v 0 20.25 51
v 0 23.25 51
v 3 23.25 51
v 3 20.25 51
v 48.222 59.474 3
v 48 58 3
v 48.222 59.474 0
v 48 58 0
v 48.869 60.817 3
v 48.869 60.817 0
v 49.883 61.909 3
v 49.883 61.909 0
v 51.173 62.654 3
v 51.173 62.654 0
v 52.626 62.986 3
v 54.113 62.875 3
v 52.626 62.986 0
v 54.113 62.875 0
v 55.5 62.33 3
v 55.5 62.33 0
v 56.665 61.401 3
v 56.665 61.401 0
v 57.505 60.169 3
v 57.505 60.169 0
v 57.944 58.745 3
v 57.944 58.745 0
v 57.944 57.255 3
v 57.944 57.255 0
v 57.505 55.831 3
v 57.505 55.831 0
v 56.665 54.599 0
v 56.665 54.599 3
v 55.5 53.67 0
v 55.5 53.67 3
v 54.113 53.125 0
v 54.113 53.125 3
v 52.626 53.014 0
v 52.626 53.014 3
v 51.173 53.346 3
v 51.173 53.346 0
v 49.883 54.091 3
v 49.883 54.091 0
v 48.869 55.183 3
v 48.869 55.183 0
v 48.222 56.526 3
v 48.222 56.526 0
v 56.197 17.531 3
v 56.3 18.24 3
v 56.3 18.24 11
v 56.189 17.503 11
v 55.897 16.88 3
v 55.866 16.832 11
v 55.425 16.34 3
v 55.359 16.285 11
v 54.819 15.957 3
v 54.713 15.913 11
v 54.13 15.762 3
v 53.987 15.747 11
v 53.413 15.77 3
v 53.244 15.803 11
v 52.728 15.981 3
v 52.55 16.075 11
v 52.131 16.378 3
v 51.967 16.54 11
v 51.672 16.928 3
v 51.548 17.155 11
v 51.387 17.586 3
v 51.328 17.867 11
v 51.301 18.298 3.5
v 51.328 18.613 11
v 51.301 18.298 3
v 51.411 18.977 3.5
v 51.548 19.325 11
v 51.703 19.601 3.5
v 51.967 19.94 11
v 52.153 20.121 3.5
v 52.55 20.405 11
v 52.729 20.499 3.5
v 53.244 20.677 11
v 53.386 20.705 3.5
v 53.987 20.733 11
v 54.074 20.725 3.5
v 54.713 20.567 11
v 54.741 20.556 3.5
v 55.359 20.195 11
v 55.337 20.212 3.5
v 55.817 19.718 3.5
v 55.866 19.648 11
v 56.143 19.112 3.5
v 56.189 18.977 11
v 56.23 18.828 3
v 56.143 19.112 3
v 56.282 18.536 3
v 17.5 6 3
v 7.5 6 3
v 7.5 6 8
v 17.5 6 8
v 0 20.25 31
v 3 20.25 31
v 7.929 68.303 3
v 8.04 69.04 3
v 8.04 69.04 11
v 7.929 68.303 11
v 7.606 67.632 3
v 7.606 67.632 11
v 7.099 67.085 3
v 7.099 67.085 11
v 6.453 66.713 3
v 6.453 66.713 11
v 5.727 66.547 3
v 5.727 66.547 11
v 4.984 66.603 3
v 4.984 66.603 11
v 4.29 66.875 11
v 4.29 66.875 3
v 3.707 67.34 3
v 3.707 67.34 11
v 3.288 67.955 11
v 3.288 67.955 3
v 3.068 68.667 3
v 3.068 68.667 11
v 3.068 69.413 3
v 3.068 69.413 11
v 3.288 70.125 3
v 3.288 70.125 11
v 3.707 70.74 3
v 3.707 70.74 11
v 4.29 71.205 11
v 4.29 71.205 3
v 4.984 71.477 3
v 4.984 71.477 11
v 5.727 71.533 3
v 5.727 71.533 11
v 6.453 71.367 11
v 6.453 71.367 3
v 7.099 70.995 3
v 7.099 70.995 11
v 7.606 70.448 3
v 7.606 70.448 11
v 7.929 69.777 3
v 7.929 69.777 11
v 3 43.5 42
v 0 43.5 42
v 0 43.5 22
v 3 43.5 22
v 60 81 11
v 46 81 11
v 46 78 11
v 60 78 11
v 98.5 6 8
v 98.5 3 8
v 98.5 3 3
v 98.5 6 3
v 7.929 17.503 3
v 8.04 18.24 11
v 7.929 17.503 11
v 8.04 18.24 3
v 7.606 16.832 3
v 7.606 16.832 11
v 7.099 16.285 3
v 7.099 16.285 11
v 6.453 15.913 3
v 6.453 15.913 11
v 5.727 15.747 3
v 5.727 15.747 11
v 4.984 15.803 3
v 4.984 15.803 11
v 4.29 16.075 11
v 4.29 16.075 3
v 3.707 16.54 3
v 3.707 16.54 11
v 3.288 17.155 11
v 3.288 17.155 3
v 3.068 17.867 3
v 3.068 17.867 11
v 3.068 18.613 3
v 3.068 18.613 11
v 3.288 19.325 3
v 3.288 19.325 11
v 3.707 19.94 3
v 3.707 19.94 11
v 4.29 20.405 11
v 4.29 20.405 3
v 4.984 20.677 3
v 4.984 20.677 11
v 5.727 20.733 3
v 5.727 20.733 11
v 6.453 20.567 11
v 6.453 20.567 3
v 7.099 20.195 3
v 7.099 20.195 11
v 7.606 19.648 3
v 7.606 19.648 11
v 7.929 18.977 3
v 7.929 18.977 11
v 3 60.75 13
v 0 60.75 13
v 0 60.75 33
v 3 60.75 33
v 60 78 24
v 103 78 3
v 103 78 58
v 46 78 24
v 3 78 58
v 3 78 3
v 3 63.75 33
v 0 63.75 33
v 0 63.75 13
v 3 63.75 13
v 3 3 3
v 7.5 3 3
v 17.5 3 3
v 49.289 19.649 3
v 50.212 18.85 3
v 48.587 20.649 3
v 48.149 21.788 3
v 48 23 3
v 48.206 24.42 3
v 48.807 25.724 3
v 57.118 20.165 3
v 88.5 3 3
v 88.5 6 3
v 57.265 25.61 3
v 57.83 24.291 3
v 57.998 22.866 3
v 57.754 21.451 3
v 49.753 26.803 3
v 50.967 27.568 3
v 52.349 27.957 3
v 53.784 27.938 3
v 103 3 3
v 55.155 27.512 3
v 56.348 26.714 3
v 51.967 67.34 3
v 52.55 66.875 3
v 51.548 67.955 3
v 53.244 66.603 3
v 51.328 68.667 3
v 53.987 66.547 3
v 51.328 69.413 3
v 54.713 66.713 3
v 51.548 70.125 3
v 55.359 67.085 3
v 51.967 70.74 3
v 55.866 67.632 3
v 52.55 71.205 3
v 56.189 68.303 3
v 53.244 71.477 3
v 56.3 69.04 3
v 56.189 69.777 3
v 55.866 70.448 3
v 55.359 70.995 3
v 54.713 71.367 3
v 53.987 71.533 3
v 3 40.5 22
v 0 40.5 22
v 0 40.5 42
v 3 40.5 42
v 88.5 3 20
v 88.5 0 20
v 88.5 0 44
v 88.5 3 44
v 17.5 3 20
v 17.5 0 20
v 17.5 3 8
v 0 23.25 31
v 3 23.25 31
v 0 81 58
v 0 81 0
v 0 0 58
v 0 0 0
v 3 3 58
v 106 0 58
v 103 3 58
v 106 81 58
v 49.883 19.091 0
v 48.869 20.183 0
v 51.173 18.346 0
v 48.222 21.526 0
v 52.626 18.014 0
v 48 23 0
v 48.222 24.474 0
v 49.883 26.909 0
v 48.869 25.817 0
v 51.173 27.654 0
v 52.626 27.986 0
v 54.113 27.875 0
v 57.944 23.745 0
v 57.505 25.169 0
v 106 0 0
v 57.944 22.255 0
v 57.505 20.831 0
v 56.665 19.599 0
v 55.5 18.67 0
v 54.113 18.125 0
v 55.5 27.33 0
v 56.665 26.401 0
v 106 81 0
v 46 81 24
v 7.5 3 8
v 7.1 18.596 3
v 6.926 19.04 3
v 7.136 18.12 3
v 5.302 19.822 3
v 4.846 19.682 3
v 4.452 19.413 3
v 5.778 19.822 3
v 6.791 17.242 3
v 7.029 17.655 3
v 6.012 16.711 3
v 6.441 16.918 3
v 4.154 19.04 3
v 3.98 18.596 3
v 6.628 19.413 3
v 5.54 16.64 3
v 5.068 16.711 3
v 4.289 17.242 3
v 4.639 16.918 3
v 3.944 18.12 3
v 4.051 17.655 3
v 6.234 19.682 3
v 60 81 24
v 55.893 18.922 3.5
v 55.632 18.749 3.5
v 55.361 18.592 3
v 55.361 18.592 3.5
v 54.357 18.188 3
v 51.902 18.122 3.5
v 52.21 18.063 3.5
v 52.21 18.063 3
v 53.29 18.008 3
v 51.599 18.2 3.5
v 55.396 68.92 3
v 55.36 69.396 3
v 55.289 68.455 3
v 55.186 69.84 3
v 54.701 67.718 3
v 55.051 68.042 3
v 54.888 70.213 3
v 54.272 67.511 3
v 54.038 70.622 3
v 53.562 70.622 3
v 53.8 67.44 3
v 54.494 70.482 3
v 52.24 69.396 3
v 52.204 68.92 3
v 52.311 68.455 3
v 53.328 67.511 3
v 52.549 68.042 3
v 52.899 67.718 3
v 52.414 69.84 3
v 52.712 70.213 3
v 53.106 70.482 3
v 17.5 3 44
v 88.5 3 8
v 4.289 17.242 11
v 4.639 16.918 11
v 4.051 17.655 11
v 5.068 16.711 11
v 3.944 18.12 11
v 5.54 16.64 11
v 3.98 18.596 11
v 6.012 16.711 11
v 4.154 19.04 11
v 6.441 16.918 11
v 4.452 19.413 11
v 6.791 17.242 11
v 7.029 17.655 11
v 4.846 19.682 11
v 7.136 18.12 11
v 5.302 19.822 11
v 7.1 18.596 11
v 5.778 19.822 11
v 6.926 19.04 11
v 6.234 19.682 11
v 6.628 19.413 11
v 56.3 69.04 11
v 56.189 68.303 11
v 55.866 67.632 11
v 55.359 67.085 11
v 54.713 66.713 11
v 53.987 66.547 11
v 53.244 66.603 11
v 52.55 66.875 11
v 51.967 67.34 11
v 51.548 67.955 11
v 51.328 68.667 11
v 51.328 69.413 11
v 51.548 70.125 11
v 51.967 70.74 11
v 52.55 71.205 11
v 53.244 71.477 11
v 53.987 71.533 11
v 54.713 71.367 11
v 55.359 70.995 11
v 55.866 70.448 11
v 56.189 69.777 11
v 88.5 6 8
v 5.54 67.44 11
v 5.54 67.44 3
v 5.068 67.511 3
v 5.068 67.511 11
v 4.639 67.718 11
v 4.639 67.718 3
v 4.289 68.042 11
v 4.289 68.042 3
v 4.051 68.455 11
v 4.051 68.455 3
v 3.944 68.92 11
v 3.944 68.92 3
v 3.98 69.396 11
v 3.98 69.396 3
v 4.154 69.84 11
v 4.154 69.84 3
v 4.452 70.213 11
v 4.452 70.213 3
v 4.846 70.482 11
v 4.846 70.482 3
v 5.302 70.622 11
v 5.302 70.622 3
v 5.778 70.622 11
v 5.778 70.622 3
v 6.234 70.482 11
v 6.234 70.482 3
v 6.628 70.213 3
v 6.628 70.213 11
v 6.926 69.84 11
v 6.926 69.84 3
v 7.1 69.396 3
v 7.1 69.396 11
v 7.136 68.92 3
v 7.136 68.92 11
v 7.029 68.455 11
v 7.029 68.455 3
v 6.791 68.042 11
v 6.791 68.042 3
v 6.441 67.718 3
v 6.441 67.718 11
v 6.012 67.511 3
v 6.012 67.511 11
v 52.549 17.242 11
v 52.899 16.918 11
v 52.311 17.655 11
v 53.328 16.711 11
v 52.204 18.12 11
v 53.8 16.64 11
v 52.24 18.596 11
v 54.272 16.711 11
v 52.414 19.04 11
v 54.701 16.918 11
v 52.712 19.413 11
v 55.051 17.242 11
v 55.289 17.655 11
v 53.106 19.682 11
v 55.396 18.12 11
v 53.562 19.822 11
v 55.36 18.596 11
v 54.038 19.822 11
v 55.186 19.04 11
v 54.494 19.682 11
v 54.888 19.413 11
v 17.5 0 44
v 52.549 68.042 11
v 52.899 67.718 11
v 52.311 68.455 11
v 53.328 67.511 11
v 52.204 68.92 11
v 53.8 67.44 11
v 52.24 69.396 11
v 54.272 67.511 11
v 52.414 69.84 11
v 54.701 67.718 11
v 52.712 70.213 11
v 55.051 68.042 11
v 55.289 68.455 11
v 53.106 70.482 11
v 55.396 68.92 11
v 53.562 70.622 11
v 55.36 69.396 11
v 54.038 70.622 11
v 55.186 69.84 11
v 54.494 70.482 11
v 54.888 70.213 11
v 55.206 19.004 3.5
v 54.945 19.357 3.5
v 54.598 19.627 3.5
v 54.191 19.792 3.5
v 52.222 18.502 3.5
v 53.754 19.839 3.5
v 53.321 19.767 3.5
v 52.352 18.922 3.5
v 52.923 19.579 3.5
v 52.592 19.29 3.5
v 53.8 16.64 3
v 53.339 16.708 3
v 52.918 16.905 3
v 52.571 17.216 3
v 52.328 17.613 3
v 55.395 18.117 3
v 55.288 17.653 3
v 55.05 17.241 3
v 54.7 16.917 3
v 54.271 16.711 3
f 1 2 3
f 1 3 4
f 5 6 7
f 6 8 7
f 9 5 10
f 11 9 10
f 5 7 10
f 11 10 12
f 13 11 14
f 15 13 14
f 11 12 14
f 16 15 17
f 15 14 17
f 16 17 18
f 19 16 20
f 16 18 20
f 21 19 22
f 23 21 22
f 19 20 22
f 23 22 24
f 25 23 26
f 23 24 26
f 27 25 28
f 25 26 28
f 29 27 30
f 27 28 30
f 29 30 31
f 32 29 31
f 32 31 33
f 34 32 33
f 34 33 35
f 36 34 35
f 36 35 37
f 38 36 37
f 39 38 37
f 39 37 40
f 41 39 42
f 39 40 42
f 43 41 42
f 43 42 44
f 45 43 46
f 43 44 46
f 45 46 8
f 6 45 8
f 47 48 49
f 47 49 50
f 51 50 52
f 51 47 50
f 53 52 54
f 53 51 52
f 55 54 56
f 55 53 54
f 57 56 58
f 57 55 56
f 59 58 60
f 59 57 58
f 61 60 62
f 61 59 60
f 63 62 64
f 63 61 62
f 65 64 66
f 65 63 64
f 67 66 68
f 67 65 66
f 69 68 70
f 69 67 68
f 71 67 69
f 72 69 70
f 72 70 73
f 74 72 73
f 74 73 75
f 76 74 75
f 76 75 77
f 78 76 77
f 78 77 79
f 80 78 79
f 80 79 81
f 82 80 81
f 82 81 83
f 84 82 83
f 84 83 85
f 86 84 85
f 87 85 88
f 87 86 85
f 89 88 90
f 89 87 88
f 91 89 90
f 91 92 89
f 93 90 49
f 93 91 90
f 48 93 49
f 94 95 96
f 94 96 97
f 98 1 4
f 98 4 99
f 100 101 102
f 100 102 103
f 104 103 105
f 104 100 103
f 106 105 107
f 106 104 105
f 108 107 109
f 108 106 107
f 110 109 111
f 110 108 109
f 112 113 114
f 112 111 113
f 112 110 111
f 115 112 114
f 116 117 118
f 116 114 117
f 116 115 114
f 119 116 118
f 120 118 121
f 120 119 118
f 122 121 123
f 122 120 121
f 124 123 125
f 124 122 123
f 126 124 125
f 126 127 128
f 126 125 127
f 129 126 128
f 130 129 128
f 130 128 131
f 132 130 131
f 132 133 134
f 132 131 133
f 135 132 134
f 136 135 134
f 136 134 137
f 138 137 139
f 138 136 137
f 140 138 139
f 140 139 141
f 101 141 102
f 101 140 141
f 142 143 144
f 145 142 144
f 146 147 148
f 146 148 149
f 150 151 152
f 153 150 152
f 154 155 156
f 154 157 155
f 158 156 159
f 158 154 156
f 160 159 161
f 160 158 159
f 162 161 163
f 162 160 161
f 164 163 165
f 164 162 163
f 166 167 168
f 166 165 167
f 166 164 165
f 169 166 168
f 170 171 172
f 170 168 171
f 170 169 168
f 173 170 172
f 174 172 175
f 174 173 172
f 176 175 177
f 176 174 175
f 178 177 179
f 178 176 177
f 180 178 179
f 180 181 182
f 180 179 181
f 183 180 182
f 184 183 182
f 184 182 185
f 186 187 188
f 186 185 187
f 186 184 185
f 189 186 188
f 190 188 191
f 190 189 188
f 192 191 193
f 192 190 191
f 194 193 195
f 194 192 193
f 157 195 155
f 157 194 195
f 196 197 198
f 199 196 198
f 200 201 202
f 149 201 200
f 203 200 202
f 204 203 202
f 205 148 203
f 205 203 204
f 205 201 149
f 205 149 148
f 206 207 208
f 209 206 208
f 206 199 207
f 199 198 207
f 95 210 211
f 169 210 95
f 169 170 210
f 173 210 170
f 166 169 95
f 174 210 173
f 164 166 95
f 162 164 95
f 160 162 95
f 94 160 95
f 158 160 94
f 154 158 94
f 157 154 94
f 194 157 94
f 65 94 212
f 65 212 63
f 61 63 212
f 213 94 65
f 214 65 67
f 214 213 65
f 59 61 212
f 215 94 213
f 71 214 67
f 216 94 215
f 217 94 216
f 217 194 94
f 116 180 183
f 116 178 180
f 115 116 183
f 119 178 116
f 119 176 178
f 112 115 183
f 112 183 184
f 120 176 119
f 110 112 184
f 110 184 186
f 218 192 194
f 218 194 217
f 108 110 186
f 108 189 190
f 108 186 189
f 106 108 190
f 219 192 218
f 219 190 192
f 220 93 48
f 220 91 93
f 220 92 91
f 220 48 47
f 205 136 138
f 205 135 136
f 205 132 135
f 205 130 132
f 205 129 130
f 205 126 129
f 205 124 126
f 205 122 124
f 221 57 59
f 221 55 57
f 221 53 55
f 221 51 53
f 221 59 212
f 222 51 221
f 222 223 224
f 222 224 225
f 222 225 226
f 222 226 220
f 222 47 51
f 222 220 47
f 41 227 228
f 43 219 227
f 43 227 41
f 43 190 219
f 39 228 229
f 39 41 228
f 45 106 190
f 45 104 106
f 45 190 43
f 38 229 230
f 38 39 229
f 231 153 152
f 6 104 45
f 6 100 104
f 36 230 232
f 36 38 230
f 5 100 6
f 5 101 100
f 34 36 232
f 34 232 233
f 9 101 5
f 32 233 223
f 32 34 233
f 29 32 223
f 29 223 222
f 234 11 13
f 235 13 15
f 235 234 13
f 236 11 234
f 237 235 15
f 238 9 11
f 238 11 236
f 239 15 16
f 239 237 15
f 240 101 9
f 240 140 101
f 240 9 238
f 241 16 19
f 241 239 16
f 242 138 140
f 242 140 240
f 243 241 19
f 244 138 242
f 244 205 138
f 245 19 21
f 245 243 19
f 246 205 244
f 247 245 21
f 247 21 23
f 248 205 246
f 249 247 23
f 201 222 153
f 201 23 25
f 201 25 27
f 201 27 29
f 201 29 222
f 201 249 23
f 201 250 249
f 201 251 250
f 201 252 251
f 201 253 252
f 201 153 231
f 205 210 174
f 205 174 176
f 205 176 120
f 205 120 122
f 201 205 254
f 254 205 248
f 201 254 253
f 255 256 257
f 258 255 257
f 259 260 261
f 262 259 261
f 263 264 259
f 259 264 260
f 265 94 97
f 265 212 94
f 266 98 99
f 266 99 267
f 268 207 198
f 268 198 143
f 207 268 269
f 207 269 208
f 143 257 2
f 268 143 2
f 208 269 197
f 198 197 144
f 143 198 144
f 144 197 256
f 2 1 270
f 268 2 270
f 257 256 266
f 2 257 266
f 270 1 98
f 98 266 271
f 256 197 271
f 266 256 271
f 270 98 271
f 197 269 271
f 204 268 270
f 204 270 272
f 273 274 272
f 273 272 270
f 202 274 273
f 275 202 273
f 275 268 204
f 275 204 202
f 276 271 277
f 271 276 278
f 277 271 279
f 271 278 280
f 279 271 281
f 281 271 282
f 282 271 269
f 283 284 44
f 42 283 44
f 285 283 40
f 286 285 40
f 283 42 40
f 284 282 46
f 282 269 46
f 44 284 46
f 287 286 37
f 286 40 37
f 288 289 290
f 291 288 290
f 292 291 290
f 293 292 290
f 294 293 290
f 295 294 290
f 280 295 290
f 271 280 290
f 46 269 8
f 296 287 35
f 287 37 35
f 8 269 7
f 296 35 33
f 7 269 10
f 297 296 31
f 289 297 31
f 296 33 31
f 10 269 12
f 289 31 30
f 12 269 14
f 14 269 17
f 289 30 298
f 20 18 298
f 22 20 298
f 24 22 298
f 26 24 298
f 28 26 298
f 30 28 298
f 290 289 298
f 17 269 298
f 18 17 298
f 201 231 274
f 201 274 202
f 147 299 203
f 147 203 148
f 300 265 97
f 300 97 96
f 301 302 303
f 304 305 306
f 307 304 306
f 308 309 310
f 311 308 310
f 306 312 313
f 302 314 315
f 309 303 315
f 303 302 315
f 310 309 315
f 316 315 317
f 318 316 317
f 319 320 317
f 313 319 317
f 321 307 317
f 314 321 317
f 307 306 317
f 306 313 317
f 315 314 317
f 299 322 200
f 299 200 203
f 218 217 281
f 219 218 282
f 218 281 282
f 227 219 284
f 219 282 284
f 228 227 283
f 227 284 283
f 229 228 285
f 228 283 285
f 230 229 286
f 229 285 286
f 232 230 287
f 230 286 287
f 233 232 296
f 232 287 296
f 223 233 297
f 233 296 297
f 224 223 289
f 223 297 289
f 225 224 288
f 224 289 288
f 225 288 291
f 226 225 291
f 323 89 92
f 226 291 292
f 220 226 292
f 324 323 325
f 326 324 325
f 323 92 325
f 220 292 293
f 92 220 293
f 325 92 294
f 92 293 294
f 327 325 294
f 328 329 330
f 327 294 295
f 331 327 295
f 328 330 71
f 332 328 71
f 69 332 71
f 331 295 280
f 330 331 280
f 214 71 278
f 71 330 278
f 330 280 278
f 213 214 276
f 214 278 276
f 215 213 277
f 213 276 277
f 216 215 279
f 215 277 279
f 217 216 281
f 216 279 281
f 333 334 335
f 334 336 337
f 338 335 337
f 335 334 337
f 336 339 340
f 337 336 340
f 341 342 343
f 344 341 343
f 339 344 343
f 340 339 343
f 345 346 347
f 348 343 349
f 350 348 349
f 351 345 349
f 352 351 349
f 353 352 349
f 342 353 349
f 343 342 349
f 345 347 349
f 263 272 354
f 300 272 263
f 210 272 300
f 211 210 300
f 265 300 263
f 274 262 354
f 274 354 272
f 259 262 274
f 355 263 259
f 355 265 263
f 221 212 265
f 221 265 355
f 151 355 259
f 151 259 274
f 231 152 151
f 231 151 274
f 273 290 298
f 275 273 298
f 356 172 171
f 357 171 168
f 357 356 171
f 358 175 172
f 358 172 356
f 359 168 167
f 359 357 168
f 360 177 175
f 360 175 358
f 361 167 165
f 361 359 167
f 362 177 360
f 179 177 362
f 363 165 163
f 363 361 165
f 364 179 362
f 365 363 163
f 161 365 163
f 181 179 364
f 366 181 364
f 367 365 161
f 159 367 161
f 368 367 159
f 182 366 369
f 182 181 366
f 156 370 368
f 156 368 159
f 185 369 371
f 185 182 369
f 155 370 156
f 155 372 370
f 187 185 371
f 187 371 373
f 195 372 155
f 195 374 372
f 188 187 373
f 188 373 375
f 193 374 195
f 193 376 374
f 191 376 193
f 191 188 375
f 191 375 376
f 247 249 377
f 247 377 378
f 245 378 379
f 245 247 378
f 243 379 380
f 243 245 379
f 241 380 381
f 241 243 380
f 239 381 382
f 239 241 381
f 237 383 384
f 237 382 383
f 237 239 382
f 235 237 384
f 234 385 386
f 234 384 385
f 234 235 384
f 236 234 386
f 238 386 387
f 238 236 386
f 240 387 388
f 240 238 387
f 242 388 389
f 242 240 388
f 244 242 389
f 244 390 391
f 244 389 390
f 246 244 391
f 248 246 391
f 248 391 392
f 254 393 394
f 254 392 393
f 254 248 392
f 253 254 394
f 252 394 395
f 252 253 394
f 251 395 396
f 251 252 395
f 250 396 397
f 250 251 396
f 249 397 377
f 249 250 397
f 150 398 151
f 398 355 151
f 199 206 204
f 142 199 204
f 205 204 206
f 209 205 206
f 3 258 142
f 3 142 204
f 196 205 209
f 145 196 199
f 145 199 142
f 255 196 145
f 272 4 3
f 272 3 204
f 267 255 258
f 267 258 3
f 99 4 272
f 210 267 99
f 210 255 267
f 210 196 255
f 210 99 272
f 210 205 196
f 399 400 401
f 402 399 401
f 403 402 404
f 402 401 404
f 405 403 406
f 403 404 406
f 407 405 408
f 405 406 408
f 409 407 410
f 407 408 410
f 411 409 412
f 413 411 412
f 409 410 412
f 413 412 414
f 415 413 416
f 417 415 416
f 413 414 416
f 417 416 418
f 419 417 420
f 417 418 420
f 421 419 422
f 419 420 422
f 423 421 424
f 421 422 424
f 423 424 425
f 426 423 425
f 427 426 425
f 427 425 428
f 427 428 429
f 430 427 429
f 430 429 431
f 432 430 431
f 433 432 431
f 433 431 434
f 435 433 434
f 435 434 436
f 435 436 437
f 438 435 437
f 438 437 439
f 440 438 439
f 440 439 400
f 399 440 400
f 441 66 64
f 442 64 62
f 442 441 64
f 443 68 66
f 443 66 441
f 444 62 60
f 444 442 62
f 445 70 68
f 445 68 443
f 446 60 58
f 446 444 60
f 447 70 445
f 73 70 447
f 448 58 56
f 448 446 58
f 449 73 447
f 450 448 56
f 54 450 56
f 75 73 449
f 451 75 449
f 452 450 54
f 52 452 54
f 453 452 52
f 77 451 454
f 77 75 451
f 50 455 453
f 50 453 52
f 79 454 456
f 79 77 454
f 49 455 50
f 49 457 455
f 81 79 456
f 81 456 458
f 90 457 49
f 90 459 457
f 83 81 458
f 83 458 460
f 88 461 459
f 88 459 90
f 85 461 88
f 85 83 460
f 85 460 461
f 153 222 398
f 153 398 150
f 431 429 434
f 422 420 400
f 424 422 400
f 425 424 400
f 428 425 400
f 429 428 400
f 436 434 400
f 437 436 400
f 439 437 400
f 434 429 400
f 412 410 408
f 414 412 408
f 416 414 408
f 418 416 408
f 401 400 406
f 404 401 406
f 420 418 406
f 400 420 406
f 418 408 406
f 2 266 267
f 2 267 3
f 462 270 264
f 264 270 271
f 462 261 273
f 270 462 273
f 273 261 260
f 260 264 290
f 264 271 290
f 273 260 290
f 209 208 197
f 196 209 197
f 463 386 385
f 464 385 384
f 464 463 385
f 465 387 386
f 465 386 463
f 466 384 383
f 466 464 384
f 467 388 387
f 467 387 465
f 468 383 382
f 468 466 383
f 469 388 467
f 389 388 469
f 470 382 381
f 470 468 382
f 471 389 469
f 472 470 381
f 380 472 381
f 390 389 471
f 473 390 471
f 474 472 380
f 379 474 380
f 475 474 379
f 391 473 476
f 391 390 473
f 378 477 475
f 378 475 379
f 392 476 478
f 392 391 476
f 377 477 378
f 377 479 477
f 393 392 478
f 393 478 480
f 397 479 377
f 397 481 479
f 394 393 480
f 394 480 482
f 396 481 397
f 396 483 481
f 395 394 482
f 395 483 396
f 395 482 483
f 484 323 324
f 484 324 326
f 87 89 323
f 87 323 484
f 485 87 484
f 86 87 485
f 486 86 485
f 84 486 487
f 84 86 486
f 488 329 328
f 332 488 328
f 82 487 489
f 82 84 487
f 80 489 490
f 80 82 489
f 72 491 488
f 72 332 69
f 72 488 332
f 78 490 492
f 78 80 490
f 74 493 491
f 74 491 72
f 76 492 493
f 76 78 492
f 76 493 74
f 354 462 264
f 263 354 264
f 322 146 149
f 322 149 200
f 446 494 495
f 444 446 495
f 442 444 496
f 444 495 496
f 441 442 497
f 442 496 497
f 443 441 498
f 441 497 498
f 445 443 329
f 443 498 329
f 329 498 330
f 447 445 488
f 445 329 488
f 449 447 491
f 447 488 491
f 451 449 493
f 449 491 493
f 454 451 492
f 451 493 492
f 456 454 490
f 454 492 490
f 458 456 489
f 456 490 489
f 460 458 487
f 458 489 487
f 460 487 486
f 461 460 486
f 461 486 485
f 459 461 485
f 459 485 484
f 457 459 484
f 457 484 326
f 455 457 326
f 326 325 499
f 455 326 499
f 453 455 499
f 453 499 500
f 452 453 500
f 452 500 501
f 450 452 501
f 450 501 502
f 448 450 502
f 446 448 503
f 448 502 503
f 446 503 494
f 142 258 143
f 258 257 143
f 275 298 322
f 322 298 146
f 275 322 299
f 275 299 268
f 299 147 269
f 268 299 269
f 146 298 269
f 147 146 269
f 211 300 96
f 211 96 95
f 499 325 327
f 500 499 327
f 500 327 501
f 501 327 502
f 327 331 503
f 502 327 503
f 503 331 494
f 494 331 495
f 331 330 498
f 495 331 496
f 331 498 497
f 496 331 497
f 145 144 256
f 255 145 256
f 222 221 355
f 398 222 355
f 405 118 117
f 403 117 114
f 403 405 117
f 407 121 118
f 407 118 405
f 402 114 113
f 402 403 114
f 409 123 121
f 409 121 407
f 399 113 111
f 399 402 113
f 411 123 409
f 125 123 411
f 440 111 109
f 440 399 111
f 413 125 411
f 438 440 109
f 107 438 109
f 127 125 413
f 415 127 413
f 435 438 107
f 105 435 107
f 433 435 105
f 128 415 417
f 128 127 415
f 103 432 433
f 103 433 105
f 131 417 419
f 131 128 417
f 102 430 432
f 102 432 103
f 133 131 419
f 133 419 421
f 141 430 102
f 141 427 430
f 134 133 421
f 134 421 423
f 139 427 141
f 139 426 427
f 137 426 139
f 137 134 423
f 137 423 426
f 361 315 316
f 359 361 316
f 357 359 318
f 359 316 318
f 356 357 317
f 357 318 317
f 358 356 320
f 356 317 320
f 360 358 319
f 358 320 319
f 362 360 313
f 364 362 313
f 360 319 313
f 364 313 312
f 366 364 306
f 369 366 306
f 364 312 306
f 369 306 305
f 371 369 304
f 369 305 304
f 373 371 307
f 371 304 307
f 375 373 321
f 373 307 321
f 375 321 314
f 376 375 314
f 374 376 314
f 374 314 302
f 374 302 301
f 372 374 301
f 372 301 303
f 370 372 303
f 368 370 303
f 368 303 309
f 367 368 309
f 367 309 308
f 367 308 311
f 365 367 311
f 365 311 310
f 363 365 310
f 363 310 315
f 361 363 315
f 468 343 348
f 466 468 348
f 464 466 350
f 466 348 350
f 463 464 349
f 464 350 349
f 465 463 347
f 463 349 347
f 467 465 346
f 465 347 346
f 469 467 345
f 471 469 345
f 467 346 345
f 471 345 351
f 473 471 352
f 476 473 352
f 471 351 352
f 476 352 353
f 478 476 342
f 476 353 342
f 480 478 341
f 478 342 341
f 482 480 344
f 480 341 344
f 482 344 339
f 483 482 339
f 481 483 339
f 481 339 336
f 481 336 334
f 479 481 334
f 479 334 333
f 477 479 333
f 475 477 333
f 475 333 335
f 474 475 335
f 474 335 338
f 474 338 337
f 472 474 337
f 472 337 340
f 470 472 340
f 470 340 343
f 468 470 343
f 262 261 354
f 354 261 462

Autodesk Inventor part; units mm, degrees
ref_plane "YZ Plane" through (0, 0, 0) normal (1, 0, 0) x (0, 1, 0)
ref_plane "XZ Plane" through (0, 0, 0) normal (0, 1, 0) x (-1, 0, 0)
ref_plane "XY Plane" through (0, 0, 0) normal (0, 0, 1) x (1, 0, 0)
sketch "Sketch1" plane through (0, 0, 0) normal (0, 0, 1) x (1, 0, 0)
  line L0 (0, 0) -> (106, 0)
  line L1 (106, 0) -> (106, 81)
  line L2 (106, 81) -> (0, 81)
  line L3 (0, 81) -> (0, 0)
  dimension "d0" = 106
  dimension "d1" = 81
extrude "Extrusion1" add sketch "Sketch1" along normal blind 58
shell "Shell1" thickness 3 removed faces 1 at (70.6667, 27, 58)
sketch "Sketch2" plane through (0, 0, 0) normal (0, -1, 0) x (1, 0, 0)
  line L0 (17.5, 20) -> (88.5, 20)
  line L1 (88.5, 20) -> (88.5, 44)
  line L2 (88.5, 44) -> (17.5, 44)
  line L3 (17.5, 44) -> (17.5, 20)
  line L4 (0, 0) -> (0, 58) projected
  line L5 (0, 0) -> (106, 0) projected
  dimension "d5" = 71
  dimension "d6" = 24
  dimension "d7" = 17.5
  dimension "d8" = 20
extrude "Extrusion2" cut sketch "Sketch2" against normal blind 3
sketch "Sketch3" plane through (0, 81, 0) normal (0, 1, 0) x (1, 0, 0)
  line L0 (60, -24) -> (46, -24)
  line L1 (46, -24) -> (46, -11)
  line L2 (46, -11) -> (60, -11)
  line L3 (60, -11) -> (60, -24)
  line L4 (106, 0) -> (106, -58) projected
  line L5 (106, 0) -> (0, 0) projected
  dimension "d11" = 14
  dimension "d12" = 13
  dimension "d13" = 46
  dimension "d14" = 11
extrude "Extrusion3" cut sketch "Sketch3" against normal blind 3
sketch "Sketch4" plane through (0, 0, 0) normal (-1, 0, 0) x (0, 0, 1)
  line L0 (33, 63.75) -> (13, 63.75)
  line L1 (13, 63.75) -> (13, 60.75)
  line L2 (13, 60.75) -> (33, 60.75)
  line L3 (33, 60.75) -> (33, 63.75)
  line L4 (42, 43.5) -> (22, 43.5)
  line L5 (22, 43.5) -> (22, 40.5)
  line L6 (22, 40.5) -> (42, 40.5)
  line L7 (42, 40.5) -> (42, 43.5)
  line L8 (31, 23.25) -> (51, 23.25)
  line L9 (51, 23.25) -> (51, 20.25)
  line L10 (51, 20.25) -> (31, 20.25)
  line L11 (31, 20.25) -> (31, 23.25)
  line L12 (0, 81) -> (0, 0) projected
  line L13 (0, 81) -> (58, 81) projected
  line L14 (0, 0) -> (58, 0) projected
  dimension "d17" = 20
  dimension "d18" = 3
  dimension "d19" = 20
  dimension "d20" = 3
  dimension "d21" = 20
  dimension "d22" = 3
  dimension "d23" = 13
  dimension "d24" = 22
  dimension "d25" = 31
  dimension "d90" = 20.25
  dimension "d91" = 40.5
  dimension "d92" = 60.75
sketch "Sketch5" plane through (3, 78, 3) normal (0, 0, 1) x (1, 0, 0)
  circle A0 centre (2.54, -59.76) radius 2.5
  line L0 (0, 0) -> (0, -75) projected
  line L1 (0, -75) -> (100, -75) projected
  circle A1 centre (2.54, -8.96) radius 2.5
  circle A2 centre (50.8, -8.96) radius 2.5
  circle A3 centre (50.8, -59.76) radius 2.5
  point P0 (-3, -78)
  dimension "d28" = 5
  dimension "d29" = 2.54
  dimension "d30" = 15.24
  dimension "d31" = 5
  dimension "d32" = 2.54
  dimension "d33" = 66.04
  dimension "d34" = 5
  dimension "d35" = 50.8
  dimension "d36" = 66.04
  dimension "d37" = 5
  dimension "d38" = 50.8
  dimension "d39" = 15.24
extrude "Extrusion4" add sketch "Sketch5" along normal blind 8
sketch "Sketch6" plane through (5.54, 69.04, 11) normal (0, 0, 1) x (1, 0, 0)
  point P0 (-5.54, -69.04)
  point P1 (0, 0)
sketch "Sketch7" plane through (5.54, 18.24, 11) normal (0, 0, 1) x (1, 0, 0)
  circle A0 centre (48.26, 0) radius 2.5 projected
  point P0 (-5.54, -18.24)
  point P1 (0, 0)
sketch "Sketch8" plane through (53.8, 69.04, 11) normal (0, 0, 1) x (1, 0, 0)
  point P0 (-53.8, -69.04)
  point P1 (0, 0)
hole "Hole1" at (5.54, 69.04, 11) direction (0, 0, -1) diameter 3.2 depth 8
hole "Hole2" at (53.8, 69.04, 11) direction (0, 0, -1) diameter 3.2 depth 8
hole "Hole3" at (5.54, 18.24, 11) direction (0, 0, -1) diameter 3.2 depth 8
sketch "Sketch9" plane through (53.8, 18.24, 11) normal (0, 0, 1) x (1, 0, 0)
  point P0 (-53.8, -18.24)
  point P1 (0, 0)
hole "Hole4" at (53.8, 18.24, 11) direction (0, 0, -1) diameter 3.2 depth 8
sketch "Sketch10" plane through (3, 3, 3) normal (0, 1, 0) x (1, 0, 0)
  line L0 (85.5, -5) -> (95.5, -5)
  line L1 (95.5, -5) -> (95.5, 0)
  line L2 (95.5, 0) -> (85.5, 0)
  line L3 (85.5, 0) -> (85.5, -5)
  line L4 (85.5, -17) -> (85.5, -41) projected
  line L5 (0, 0) -> (100, 0) projected
  line L6 (14.5, -5) -> (4.5, -5)
  line L7 (4.5, -5) -> (4.5, 0)
  line L8 (4.5, 0) -> (14.5, 0)
  line L9 (14.5, 0) -> (14.5, -5)
  line L10 (14.5, -41) -> (14.5, -17) projected
  point P0 (-3, 3)
  dimension "d70" = 10
  dimension "d71" = 5
  dimension "d72" = 0
  dimension "d74" = 10
  dimension "d75" = 5
  dimension "d76" = 0
  dimension "d77" = 0
  dimension "d80" = 0
extrude "Extrusion5" add sketch "Sketch10" along normal blind 3
sketch "Sketch11" plane through (0, 0, 0) normal (0, 0, -1) x (-1, 0, 0)
  circle A0 centre (-53, 58) radius 5
  circle A1 centre (-53, 23) radius 5
  line L0 (-106, 0) -> (-106, 81) projected
  line L1 (-106, 81) -> (0, 81) projected
  line L2 (0, 0) -> (-106, 0) projected
  dimension "d81" = 10
  dimension "d82" = 10
  dimension "d83" = 53
  dimension "d84" = 53
  dimension "d85" = 23
  dimension "d86" = 23
extrude "Extrusion6" cut sketch "Sketch11" against normal blind 3.5
extrude "Extrusion7" cut sketch "Sketch4" against normal blind 3.5
properties part number "air-monitor_enclosure"
